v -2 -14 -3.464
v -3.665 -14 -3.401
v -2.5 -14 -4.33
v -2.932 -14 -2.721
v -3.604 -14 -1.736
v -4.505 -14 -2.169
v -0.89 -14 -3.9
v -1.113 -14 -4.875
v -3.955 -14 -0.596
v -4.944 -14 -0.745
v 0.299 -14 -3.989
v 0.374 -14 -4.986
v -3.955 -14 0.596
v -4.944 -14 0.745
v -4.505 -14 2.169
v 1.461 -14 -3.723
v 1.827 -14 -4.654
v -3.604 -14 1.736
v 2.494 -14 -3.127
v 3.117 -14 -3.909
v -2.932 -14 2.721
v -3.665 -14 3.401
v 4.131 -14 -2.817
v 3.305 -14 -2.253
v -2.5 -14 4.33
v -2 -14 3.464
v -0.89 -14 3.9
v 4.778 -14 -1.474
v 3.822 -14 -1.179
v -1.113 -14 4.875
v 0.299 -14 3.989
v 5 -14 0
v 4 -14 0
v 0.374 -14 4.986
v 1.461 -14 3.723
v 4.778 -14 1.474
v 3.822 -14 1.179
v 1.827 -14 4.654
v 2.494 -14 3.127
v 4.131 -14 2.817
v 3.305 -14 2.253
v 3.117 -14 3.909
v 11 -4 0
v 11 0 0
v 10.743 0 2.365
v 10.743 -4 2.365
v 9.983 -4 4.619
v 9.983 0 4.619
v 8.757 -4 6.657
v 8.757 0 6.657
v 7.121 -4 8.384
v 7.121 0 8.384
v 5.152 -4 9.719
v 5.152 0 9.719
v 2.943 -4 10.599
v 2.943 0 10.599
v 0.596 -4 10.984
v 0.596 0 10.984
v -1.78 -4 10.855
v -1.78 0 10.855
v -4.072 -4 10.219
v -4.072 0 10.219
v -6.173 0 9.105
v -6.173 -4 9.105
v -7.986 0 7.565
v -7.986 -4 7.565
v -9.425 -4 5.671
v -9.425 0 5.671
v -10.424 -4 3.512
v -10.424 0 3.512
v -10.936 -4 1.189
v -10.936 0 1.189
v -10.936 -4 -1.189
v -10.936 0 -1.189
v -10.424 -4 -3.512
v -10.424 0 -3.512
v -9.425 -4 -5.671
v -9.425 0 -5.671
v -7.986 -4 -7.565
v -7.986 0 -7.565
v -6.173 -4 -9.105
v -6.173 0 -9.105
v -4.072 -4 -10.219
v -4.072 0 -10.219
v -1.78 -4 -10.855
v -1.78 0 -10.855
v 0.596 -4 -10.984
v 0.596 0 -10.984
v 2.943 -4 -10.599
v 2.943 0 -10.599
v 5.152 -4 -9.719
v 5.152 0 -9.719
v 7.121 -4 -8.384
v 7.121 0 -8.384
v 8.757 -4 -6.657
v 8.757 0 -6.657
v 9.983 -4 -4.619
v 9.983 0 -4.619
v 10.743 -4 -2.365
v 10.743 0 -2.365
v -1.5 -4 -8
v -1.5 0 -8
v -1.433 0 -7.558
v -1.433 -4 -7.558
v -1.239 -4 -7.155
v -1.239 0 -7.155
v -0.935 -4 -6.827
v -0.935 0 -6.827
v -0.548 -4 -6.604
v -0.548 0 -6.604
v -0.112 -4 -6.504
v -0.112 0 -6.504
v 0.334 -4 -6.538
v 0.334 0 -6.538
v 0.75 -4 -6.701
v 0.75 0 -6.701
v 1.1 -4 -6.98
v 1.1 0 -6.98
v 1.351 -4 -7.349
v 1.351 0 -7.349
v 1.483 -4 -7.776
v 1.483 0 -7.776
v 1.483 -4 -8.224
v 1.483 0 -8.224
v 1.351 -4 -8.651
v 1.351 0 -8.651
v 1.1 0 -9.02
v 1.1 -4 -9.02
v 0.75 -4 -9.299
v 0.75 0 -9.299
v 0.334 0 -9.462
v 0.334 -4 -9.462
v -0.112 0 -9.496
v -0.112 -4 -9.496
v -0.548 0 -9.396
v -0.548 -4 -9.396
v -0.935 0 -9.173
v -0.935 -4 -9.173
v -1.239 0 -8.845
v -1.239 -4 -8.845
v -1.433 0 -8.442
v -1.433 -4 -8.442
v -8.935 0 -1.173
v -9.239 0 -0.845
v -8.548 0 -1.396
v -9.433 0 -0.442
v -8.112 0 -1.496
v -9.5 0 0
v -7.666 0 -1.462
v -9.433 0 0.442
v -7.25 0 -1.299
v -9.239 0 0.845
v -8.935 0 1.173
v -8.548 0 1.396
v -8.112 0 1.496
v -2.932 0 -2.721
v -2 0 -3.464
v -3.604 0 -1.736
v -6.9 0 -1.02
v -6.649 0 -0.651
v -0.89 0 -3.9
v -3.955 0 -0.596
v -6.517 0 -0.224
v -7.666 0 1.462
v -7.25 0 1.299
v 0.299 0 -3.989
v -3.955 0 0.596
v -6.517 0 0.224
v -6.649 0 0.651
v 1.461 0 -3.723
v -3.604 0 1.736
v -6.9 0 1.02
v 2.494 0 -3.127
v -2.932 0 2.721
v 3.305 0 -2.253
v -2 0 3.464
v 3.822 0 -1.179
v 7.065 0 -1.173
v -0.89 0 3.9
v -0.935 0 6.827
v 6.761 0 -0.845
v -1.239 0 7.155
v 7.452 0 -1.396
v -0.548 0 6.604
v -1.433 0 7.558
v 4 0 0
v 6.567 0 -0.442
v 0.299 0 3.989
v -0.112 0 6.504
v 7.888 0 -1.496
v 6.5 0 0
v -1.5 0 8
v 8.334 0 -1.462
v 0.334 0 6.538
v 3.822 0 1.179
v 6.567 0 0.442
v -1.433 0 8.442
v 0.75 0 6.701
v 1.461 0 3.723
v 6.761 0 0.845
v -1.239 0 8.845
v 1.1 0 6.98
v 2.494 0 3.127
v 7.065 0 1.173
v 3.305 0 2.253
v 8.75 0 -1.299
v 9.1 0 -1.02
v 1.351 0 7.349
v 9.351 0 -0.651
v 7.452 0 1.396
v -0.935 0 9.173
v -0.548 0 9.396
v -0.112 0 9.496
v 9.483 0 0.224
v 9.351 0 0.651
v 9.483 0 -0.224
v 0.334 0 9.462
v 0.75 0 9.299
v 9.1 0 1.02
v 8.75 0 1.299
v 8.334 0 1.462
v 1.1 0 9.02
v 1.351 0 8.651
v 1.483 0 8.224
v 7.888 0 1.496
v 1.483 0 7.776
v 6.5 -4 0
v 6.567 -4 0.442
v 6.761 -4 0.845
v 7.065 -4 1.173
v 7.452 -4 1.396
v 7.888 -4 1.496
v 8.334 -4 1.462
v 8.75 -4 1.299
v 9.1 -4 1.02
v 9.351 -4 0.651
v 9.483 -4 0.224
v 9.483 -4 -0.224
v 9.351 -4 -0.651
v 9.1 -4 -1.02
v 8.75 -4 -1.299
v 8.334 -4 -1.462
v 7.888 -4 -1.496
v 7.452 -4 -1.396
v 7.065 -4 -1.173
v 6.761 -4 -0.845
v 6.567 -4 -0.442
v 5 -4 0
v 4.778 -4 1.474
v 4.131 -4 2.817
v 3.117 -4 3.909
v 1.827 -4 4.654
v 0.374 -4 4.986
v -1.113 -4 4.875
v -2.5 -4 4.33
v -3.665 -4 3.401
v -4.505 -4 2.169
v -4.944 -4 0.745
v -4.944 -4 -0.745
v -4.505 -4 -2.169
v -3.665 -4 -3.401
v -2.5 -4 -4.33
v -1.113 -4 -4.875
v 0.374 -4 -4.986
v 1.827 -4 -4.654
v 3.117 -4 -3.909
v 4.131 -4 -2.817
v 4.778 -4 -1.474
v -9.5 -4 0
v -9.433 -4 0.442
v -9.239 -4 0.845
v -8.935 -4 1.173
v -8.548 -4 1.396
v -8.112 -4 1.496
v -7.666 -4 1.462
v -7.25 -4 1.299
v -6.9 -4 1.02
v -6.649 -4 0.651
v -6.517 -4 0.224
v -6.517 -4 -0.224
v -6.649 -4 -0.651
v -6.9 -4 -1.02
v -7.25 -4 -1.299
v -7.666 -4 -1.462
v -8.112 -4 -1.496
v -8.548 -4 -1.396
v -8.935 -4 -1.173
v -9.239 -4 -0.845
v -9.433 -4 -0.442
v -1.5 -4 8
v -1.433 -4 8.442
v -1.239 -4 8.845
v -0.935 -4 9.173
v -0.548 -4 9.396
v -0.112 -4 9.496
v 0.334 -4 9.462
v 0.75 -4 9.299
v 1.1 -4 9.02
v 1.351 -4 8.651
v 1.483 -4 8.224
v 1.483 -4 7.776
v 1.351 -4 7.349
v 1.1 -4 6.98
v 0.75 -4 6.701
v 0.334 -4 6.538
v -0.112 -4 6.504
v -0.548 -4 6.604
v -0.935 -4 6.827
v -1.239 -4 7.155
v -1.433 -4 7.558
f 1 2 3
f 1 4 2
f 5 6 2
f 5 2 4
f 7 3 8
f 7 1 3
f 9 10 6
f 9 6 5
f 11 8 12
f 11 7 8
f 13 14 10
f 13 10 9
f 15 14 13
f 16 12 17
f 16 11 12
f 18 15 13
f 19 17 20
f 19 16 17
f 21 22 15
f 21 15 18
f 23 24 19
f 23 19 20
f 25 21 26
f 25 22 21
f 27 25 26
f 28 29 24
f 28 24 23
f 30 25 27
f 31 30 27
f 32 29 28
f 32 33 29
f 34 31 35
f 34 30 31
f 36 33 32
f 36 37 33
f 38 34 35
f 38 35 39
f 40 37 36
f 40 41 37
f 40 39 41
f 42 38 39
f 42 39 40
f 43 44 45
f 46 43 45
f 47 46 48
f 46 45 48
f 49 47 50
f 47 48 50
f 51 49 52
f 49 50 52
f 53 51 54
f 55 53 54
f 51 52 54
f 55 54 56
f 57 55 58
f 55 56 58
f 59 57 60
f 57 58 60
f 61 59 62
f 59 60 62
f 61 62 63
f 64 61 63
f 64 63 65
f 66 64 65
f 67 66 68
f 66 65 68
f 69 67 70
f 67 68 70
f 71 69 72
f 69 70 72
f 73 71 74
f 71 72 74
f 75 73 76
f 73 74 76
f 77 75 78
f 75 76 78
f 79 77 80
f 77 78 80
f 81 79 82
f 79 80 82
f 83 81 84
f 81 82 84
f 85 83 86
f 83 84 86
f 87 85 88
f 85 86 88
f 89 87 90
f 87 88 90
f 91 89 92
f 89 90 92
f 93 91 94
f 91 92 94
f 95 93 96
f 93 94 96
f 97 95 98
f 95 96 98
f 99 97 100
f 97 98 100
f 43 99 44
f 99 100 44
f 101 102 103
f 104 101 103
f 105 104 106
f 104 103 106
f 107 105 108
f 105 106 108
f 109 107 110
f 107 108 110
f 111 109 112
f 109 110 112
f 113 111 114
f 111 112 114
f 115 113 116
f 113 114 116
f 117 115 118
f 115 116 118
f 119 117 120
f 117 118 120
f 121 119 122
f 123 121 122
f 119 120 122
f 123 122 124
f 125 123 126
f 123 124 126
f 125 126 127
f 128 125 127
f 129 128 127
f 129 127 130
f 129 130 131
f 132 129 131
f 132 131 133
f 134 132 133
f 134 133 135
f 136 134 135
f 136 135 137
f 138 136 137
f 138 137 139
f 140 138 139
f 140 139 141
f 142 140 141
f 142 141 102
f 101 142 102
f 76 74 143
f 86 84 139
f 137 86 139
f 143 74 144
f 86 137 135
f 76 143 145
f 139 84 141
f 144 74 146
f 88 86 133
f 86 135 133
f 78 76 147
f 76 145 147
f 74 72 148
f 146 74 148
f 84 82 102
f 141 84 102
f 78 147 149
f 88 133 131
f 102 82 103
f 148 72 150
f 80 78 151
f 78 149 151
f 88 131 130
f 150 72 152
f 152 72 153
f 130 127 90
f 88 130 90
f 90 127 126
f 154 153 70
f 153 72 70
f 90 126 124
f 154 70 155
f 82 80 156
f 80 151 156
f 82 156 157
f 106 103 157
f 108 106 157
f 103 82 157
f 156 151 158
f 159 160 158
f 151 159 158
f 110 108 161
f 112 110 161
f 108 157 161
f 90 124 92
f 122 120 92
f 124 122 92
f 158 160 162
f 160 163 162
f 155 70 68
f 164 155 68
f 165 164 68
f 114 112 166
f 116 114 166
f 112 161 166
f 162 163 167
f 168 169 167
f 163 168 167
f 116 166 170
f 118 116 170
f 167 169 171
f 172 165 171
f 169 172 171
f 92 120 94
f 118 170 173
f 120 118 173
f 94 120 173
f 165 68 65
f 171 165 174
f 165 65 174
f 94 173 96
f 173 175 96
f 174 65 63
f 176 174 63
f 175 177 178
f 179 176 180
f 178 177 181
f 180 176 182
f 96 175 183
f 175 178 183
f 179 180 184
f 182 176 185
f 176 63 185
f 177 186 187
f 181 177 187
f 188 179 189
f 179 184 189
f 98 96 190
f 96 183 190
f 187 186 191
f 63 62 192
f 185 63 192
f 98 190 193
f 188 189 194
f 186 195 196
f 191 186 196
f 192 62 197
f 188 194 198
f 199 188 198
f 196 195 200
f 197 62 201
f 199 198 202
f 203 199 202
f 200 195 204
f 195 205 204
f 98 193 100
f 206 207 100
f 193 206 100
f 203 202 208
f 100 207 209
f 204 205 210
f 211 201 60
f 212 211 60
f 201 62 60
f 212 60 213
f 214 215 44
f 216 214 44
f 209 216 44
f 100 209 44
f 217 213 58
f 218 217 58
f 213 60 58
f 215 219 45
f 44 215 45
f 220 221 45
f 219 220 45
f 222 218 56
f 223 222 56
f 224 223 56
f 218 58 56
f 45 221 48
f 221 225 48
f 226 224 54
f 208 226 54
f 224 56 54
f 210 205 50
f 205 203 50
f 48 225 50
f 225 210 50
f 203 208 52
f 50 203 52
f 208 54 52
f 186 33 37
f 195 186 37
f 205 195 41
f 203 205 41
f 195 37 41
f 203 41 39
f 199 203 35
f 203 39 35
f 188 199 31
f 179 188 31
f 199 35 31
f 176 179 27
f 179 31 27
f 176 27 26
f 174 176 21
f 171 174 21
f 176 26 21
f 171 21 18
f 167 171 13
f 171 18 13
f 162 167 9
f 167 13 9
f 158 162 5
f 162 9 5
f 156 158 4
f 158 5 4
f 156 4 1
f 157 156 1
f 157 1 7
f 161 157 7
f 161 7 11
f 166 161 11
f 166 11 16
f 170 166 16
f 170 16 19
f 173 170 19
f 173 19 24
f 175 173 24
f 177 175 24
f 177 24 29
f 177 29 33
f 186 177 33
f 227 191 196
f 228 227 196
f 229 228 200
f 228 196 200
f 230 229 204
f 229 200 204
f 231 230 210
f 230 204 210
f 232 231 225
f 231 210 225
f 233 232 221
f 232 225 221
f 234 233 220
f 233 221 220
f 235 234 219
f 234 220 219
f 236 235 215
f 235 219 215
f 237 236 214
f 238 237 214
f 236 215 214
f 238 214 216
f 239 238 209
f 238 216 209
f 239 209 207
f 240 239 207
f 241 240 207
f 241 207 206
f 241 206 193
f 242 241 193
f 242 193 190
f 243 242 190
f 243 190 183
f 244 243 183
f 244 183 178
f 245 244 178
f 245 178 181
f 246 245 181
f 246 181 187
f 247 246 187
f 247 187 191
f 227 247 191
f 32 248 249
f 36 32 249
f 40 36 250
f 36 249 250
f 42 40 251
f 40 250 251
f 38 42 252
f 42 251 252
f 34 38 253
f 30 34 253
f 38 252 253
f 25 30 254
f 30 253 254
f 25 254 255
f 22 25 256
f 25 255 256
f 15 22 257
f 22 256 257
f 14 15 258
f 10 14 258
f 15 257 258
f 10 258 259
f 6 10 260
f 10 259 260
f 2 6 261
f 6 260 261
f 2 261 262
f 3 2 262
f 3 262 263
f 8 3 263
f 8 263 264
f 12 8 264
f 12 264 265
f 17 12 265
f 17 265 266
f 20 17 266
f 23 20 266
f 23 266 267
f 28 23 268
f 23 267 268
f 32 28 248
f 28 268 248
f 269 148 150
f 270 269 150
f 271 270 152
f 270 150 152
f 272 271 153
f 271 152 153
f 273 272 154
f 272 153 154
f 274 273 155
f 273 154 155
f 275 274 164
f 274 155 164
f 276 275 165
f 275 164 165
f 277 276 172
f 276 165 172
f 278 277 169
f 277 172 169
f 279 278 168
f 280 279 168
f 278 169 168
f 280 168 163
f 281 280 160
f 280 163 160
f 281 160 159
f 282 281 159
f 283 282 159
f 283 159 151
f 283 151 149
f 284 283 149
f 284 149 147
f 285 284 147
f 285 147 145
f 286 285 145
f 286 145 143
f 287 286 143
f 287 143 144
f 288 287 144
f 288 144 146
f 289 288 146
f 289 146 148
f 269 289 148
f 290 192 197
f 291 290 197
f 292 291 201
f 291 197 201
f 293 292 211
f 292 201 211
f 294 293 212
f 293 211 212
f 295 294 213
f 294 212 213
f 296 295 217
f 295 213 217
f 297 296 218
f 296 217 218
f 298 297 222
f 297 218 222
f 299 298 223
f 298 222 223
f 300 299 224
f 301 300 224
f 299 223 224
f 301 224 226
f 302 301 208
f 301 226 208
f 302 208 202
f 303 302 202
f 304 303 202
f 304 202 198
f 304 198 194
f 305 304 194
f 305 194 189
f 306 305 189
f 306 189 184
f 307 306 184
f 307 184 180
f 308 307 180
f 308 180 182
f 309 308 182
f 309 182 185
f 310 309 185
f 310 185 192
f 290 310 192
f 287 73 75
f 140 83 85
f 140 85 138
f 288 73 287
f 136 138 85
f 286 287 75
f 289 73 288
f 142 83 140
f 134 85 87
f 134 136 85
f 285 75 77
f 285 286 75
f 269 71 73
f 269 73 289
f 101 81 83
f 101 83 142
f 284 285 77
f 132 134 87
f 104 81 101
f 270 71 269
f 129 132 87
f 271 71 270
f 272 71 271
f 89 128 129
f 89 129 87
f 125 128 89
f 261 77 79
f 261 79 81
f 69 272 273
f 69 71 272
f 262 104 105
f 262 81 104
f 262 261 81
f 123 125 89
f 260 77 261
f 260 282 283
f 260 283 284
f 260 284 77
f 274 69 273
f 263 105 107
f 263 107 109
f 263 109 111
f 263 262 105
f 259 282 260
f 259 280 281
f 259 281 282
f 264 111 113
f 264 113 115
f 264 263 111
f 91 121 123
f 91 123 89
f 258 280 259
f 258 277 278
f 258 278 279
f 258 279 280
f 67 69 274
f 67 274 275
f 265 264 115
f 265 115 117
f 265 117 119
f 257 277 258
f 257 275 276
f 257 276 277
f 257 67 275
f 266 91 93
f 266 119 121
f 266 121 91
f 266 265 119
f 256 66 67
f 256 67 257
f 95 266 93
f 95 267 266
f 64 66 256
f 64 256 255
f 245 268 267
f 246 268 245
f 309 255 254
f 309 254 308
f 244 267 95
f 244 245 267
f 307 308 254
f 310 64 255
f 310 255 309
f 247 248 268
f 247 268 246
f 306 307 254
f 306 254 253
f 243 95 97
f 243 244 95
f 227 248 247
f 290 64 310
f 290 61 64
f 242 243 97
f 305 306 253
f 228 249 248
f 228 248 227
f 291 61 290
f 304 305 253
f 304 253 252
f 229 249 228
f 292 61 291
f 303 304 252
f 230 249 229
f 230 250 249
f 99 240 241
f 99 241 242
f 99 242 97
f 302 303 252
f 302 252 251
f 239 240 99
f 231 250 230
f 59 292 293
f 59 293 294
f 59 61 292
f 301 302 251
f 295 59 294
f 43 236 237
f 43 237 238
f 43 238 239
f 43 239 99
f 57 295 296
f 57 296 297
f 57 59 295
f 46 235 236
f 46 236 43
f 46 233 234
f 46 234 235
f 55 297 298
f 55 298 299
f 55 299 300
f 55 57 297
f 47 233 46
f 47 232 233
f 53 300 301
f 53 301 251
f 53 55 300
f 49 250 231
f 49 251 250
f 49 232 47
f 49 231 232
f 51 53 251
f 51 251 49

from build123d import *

# Parameters (mm, degrees)
F0_R     = 11
F1_DEPTH = 4
F2_R     = 5
F3_DEPTH = 10
F4_R     = 4
F5_DEPTH = 25
F6_R     = 1.5
F7_DEPTH = 25


with BuildPart() as f1:
    # F0 (on Front) → F1 (new body)
    with BuildSketch(Plane.XZ):
        Circle(F0_R)
    extrude(amount=F1_DEPTH)

    # F2 (on face) → F3 (join)
    with BuildSketch(Plane.XZ.offset(4)):
        Circle(F2_R)
    extrude(amount=F3_DEPTH)

    # F4 (on face) → F5 (cut)
    with BuildSketch(Plane.XZ.offset(14)):
        Circle(F4_R)
    extrude(amount=-F5_DEPTH, mode=Mode.SUBTRACT)

    # F6 (on face) → F7 (cut)
    with BuildSketch(Plane(origin=(0, 0, 0), x_dir=(-1, 0, 0), z_dir=(0, 1, 0))):
        with Locations((-8, 0)):
            Circle(F6_R)
        with Locations((0, 8)):
            Circle(F6_R)
        with Locations((8, 0)):
            Circle(F6_R)
        with Locations((0, -8)):
            Circle(F6_R)
    extrude(amount=-F7_DEPTH, mode=Mode.SUBTRACT)


solid = f1.part
